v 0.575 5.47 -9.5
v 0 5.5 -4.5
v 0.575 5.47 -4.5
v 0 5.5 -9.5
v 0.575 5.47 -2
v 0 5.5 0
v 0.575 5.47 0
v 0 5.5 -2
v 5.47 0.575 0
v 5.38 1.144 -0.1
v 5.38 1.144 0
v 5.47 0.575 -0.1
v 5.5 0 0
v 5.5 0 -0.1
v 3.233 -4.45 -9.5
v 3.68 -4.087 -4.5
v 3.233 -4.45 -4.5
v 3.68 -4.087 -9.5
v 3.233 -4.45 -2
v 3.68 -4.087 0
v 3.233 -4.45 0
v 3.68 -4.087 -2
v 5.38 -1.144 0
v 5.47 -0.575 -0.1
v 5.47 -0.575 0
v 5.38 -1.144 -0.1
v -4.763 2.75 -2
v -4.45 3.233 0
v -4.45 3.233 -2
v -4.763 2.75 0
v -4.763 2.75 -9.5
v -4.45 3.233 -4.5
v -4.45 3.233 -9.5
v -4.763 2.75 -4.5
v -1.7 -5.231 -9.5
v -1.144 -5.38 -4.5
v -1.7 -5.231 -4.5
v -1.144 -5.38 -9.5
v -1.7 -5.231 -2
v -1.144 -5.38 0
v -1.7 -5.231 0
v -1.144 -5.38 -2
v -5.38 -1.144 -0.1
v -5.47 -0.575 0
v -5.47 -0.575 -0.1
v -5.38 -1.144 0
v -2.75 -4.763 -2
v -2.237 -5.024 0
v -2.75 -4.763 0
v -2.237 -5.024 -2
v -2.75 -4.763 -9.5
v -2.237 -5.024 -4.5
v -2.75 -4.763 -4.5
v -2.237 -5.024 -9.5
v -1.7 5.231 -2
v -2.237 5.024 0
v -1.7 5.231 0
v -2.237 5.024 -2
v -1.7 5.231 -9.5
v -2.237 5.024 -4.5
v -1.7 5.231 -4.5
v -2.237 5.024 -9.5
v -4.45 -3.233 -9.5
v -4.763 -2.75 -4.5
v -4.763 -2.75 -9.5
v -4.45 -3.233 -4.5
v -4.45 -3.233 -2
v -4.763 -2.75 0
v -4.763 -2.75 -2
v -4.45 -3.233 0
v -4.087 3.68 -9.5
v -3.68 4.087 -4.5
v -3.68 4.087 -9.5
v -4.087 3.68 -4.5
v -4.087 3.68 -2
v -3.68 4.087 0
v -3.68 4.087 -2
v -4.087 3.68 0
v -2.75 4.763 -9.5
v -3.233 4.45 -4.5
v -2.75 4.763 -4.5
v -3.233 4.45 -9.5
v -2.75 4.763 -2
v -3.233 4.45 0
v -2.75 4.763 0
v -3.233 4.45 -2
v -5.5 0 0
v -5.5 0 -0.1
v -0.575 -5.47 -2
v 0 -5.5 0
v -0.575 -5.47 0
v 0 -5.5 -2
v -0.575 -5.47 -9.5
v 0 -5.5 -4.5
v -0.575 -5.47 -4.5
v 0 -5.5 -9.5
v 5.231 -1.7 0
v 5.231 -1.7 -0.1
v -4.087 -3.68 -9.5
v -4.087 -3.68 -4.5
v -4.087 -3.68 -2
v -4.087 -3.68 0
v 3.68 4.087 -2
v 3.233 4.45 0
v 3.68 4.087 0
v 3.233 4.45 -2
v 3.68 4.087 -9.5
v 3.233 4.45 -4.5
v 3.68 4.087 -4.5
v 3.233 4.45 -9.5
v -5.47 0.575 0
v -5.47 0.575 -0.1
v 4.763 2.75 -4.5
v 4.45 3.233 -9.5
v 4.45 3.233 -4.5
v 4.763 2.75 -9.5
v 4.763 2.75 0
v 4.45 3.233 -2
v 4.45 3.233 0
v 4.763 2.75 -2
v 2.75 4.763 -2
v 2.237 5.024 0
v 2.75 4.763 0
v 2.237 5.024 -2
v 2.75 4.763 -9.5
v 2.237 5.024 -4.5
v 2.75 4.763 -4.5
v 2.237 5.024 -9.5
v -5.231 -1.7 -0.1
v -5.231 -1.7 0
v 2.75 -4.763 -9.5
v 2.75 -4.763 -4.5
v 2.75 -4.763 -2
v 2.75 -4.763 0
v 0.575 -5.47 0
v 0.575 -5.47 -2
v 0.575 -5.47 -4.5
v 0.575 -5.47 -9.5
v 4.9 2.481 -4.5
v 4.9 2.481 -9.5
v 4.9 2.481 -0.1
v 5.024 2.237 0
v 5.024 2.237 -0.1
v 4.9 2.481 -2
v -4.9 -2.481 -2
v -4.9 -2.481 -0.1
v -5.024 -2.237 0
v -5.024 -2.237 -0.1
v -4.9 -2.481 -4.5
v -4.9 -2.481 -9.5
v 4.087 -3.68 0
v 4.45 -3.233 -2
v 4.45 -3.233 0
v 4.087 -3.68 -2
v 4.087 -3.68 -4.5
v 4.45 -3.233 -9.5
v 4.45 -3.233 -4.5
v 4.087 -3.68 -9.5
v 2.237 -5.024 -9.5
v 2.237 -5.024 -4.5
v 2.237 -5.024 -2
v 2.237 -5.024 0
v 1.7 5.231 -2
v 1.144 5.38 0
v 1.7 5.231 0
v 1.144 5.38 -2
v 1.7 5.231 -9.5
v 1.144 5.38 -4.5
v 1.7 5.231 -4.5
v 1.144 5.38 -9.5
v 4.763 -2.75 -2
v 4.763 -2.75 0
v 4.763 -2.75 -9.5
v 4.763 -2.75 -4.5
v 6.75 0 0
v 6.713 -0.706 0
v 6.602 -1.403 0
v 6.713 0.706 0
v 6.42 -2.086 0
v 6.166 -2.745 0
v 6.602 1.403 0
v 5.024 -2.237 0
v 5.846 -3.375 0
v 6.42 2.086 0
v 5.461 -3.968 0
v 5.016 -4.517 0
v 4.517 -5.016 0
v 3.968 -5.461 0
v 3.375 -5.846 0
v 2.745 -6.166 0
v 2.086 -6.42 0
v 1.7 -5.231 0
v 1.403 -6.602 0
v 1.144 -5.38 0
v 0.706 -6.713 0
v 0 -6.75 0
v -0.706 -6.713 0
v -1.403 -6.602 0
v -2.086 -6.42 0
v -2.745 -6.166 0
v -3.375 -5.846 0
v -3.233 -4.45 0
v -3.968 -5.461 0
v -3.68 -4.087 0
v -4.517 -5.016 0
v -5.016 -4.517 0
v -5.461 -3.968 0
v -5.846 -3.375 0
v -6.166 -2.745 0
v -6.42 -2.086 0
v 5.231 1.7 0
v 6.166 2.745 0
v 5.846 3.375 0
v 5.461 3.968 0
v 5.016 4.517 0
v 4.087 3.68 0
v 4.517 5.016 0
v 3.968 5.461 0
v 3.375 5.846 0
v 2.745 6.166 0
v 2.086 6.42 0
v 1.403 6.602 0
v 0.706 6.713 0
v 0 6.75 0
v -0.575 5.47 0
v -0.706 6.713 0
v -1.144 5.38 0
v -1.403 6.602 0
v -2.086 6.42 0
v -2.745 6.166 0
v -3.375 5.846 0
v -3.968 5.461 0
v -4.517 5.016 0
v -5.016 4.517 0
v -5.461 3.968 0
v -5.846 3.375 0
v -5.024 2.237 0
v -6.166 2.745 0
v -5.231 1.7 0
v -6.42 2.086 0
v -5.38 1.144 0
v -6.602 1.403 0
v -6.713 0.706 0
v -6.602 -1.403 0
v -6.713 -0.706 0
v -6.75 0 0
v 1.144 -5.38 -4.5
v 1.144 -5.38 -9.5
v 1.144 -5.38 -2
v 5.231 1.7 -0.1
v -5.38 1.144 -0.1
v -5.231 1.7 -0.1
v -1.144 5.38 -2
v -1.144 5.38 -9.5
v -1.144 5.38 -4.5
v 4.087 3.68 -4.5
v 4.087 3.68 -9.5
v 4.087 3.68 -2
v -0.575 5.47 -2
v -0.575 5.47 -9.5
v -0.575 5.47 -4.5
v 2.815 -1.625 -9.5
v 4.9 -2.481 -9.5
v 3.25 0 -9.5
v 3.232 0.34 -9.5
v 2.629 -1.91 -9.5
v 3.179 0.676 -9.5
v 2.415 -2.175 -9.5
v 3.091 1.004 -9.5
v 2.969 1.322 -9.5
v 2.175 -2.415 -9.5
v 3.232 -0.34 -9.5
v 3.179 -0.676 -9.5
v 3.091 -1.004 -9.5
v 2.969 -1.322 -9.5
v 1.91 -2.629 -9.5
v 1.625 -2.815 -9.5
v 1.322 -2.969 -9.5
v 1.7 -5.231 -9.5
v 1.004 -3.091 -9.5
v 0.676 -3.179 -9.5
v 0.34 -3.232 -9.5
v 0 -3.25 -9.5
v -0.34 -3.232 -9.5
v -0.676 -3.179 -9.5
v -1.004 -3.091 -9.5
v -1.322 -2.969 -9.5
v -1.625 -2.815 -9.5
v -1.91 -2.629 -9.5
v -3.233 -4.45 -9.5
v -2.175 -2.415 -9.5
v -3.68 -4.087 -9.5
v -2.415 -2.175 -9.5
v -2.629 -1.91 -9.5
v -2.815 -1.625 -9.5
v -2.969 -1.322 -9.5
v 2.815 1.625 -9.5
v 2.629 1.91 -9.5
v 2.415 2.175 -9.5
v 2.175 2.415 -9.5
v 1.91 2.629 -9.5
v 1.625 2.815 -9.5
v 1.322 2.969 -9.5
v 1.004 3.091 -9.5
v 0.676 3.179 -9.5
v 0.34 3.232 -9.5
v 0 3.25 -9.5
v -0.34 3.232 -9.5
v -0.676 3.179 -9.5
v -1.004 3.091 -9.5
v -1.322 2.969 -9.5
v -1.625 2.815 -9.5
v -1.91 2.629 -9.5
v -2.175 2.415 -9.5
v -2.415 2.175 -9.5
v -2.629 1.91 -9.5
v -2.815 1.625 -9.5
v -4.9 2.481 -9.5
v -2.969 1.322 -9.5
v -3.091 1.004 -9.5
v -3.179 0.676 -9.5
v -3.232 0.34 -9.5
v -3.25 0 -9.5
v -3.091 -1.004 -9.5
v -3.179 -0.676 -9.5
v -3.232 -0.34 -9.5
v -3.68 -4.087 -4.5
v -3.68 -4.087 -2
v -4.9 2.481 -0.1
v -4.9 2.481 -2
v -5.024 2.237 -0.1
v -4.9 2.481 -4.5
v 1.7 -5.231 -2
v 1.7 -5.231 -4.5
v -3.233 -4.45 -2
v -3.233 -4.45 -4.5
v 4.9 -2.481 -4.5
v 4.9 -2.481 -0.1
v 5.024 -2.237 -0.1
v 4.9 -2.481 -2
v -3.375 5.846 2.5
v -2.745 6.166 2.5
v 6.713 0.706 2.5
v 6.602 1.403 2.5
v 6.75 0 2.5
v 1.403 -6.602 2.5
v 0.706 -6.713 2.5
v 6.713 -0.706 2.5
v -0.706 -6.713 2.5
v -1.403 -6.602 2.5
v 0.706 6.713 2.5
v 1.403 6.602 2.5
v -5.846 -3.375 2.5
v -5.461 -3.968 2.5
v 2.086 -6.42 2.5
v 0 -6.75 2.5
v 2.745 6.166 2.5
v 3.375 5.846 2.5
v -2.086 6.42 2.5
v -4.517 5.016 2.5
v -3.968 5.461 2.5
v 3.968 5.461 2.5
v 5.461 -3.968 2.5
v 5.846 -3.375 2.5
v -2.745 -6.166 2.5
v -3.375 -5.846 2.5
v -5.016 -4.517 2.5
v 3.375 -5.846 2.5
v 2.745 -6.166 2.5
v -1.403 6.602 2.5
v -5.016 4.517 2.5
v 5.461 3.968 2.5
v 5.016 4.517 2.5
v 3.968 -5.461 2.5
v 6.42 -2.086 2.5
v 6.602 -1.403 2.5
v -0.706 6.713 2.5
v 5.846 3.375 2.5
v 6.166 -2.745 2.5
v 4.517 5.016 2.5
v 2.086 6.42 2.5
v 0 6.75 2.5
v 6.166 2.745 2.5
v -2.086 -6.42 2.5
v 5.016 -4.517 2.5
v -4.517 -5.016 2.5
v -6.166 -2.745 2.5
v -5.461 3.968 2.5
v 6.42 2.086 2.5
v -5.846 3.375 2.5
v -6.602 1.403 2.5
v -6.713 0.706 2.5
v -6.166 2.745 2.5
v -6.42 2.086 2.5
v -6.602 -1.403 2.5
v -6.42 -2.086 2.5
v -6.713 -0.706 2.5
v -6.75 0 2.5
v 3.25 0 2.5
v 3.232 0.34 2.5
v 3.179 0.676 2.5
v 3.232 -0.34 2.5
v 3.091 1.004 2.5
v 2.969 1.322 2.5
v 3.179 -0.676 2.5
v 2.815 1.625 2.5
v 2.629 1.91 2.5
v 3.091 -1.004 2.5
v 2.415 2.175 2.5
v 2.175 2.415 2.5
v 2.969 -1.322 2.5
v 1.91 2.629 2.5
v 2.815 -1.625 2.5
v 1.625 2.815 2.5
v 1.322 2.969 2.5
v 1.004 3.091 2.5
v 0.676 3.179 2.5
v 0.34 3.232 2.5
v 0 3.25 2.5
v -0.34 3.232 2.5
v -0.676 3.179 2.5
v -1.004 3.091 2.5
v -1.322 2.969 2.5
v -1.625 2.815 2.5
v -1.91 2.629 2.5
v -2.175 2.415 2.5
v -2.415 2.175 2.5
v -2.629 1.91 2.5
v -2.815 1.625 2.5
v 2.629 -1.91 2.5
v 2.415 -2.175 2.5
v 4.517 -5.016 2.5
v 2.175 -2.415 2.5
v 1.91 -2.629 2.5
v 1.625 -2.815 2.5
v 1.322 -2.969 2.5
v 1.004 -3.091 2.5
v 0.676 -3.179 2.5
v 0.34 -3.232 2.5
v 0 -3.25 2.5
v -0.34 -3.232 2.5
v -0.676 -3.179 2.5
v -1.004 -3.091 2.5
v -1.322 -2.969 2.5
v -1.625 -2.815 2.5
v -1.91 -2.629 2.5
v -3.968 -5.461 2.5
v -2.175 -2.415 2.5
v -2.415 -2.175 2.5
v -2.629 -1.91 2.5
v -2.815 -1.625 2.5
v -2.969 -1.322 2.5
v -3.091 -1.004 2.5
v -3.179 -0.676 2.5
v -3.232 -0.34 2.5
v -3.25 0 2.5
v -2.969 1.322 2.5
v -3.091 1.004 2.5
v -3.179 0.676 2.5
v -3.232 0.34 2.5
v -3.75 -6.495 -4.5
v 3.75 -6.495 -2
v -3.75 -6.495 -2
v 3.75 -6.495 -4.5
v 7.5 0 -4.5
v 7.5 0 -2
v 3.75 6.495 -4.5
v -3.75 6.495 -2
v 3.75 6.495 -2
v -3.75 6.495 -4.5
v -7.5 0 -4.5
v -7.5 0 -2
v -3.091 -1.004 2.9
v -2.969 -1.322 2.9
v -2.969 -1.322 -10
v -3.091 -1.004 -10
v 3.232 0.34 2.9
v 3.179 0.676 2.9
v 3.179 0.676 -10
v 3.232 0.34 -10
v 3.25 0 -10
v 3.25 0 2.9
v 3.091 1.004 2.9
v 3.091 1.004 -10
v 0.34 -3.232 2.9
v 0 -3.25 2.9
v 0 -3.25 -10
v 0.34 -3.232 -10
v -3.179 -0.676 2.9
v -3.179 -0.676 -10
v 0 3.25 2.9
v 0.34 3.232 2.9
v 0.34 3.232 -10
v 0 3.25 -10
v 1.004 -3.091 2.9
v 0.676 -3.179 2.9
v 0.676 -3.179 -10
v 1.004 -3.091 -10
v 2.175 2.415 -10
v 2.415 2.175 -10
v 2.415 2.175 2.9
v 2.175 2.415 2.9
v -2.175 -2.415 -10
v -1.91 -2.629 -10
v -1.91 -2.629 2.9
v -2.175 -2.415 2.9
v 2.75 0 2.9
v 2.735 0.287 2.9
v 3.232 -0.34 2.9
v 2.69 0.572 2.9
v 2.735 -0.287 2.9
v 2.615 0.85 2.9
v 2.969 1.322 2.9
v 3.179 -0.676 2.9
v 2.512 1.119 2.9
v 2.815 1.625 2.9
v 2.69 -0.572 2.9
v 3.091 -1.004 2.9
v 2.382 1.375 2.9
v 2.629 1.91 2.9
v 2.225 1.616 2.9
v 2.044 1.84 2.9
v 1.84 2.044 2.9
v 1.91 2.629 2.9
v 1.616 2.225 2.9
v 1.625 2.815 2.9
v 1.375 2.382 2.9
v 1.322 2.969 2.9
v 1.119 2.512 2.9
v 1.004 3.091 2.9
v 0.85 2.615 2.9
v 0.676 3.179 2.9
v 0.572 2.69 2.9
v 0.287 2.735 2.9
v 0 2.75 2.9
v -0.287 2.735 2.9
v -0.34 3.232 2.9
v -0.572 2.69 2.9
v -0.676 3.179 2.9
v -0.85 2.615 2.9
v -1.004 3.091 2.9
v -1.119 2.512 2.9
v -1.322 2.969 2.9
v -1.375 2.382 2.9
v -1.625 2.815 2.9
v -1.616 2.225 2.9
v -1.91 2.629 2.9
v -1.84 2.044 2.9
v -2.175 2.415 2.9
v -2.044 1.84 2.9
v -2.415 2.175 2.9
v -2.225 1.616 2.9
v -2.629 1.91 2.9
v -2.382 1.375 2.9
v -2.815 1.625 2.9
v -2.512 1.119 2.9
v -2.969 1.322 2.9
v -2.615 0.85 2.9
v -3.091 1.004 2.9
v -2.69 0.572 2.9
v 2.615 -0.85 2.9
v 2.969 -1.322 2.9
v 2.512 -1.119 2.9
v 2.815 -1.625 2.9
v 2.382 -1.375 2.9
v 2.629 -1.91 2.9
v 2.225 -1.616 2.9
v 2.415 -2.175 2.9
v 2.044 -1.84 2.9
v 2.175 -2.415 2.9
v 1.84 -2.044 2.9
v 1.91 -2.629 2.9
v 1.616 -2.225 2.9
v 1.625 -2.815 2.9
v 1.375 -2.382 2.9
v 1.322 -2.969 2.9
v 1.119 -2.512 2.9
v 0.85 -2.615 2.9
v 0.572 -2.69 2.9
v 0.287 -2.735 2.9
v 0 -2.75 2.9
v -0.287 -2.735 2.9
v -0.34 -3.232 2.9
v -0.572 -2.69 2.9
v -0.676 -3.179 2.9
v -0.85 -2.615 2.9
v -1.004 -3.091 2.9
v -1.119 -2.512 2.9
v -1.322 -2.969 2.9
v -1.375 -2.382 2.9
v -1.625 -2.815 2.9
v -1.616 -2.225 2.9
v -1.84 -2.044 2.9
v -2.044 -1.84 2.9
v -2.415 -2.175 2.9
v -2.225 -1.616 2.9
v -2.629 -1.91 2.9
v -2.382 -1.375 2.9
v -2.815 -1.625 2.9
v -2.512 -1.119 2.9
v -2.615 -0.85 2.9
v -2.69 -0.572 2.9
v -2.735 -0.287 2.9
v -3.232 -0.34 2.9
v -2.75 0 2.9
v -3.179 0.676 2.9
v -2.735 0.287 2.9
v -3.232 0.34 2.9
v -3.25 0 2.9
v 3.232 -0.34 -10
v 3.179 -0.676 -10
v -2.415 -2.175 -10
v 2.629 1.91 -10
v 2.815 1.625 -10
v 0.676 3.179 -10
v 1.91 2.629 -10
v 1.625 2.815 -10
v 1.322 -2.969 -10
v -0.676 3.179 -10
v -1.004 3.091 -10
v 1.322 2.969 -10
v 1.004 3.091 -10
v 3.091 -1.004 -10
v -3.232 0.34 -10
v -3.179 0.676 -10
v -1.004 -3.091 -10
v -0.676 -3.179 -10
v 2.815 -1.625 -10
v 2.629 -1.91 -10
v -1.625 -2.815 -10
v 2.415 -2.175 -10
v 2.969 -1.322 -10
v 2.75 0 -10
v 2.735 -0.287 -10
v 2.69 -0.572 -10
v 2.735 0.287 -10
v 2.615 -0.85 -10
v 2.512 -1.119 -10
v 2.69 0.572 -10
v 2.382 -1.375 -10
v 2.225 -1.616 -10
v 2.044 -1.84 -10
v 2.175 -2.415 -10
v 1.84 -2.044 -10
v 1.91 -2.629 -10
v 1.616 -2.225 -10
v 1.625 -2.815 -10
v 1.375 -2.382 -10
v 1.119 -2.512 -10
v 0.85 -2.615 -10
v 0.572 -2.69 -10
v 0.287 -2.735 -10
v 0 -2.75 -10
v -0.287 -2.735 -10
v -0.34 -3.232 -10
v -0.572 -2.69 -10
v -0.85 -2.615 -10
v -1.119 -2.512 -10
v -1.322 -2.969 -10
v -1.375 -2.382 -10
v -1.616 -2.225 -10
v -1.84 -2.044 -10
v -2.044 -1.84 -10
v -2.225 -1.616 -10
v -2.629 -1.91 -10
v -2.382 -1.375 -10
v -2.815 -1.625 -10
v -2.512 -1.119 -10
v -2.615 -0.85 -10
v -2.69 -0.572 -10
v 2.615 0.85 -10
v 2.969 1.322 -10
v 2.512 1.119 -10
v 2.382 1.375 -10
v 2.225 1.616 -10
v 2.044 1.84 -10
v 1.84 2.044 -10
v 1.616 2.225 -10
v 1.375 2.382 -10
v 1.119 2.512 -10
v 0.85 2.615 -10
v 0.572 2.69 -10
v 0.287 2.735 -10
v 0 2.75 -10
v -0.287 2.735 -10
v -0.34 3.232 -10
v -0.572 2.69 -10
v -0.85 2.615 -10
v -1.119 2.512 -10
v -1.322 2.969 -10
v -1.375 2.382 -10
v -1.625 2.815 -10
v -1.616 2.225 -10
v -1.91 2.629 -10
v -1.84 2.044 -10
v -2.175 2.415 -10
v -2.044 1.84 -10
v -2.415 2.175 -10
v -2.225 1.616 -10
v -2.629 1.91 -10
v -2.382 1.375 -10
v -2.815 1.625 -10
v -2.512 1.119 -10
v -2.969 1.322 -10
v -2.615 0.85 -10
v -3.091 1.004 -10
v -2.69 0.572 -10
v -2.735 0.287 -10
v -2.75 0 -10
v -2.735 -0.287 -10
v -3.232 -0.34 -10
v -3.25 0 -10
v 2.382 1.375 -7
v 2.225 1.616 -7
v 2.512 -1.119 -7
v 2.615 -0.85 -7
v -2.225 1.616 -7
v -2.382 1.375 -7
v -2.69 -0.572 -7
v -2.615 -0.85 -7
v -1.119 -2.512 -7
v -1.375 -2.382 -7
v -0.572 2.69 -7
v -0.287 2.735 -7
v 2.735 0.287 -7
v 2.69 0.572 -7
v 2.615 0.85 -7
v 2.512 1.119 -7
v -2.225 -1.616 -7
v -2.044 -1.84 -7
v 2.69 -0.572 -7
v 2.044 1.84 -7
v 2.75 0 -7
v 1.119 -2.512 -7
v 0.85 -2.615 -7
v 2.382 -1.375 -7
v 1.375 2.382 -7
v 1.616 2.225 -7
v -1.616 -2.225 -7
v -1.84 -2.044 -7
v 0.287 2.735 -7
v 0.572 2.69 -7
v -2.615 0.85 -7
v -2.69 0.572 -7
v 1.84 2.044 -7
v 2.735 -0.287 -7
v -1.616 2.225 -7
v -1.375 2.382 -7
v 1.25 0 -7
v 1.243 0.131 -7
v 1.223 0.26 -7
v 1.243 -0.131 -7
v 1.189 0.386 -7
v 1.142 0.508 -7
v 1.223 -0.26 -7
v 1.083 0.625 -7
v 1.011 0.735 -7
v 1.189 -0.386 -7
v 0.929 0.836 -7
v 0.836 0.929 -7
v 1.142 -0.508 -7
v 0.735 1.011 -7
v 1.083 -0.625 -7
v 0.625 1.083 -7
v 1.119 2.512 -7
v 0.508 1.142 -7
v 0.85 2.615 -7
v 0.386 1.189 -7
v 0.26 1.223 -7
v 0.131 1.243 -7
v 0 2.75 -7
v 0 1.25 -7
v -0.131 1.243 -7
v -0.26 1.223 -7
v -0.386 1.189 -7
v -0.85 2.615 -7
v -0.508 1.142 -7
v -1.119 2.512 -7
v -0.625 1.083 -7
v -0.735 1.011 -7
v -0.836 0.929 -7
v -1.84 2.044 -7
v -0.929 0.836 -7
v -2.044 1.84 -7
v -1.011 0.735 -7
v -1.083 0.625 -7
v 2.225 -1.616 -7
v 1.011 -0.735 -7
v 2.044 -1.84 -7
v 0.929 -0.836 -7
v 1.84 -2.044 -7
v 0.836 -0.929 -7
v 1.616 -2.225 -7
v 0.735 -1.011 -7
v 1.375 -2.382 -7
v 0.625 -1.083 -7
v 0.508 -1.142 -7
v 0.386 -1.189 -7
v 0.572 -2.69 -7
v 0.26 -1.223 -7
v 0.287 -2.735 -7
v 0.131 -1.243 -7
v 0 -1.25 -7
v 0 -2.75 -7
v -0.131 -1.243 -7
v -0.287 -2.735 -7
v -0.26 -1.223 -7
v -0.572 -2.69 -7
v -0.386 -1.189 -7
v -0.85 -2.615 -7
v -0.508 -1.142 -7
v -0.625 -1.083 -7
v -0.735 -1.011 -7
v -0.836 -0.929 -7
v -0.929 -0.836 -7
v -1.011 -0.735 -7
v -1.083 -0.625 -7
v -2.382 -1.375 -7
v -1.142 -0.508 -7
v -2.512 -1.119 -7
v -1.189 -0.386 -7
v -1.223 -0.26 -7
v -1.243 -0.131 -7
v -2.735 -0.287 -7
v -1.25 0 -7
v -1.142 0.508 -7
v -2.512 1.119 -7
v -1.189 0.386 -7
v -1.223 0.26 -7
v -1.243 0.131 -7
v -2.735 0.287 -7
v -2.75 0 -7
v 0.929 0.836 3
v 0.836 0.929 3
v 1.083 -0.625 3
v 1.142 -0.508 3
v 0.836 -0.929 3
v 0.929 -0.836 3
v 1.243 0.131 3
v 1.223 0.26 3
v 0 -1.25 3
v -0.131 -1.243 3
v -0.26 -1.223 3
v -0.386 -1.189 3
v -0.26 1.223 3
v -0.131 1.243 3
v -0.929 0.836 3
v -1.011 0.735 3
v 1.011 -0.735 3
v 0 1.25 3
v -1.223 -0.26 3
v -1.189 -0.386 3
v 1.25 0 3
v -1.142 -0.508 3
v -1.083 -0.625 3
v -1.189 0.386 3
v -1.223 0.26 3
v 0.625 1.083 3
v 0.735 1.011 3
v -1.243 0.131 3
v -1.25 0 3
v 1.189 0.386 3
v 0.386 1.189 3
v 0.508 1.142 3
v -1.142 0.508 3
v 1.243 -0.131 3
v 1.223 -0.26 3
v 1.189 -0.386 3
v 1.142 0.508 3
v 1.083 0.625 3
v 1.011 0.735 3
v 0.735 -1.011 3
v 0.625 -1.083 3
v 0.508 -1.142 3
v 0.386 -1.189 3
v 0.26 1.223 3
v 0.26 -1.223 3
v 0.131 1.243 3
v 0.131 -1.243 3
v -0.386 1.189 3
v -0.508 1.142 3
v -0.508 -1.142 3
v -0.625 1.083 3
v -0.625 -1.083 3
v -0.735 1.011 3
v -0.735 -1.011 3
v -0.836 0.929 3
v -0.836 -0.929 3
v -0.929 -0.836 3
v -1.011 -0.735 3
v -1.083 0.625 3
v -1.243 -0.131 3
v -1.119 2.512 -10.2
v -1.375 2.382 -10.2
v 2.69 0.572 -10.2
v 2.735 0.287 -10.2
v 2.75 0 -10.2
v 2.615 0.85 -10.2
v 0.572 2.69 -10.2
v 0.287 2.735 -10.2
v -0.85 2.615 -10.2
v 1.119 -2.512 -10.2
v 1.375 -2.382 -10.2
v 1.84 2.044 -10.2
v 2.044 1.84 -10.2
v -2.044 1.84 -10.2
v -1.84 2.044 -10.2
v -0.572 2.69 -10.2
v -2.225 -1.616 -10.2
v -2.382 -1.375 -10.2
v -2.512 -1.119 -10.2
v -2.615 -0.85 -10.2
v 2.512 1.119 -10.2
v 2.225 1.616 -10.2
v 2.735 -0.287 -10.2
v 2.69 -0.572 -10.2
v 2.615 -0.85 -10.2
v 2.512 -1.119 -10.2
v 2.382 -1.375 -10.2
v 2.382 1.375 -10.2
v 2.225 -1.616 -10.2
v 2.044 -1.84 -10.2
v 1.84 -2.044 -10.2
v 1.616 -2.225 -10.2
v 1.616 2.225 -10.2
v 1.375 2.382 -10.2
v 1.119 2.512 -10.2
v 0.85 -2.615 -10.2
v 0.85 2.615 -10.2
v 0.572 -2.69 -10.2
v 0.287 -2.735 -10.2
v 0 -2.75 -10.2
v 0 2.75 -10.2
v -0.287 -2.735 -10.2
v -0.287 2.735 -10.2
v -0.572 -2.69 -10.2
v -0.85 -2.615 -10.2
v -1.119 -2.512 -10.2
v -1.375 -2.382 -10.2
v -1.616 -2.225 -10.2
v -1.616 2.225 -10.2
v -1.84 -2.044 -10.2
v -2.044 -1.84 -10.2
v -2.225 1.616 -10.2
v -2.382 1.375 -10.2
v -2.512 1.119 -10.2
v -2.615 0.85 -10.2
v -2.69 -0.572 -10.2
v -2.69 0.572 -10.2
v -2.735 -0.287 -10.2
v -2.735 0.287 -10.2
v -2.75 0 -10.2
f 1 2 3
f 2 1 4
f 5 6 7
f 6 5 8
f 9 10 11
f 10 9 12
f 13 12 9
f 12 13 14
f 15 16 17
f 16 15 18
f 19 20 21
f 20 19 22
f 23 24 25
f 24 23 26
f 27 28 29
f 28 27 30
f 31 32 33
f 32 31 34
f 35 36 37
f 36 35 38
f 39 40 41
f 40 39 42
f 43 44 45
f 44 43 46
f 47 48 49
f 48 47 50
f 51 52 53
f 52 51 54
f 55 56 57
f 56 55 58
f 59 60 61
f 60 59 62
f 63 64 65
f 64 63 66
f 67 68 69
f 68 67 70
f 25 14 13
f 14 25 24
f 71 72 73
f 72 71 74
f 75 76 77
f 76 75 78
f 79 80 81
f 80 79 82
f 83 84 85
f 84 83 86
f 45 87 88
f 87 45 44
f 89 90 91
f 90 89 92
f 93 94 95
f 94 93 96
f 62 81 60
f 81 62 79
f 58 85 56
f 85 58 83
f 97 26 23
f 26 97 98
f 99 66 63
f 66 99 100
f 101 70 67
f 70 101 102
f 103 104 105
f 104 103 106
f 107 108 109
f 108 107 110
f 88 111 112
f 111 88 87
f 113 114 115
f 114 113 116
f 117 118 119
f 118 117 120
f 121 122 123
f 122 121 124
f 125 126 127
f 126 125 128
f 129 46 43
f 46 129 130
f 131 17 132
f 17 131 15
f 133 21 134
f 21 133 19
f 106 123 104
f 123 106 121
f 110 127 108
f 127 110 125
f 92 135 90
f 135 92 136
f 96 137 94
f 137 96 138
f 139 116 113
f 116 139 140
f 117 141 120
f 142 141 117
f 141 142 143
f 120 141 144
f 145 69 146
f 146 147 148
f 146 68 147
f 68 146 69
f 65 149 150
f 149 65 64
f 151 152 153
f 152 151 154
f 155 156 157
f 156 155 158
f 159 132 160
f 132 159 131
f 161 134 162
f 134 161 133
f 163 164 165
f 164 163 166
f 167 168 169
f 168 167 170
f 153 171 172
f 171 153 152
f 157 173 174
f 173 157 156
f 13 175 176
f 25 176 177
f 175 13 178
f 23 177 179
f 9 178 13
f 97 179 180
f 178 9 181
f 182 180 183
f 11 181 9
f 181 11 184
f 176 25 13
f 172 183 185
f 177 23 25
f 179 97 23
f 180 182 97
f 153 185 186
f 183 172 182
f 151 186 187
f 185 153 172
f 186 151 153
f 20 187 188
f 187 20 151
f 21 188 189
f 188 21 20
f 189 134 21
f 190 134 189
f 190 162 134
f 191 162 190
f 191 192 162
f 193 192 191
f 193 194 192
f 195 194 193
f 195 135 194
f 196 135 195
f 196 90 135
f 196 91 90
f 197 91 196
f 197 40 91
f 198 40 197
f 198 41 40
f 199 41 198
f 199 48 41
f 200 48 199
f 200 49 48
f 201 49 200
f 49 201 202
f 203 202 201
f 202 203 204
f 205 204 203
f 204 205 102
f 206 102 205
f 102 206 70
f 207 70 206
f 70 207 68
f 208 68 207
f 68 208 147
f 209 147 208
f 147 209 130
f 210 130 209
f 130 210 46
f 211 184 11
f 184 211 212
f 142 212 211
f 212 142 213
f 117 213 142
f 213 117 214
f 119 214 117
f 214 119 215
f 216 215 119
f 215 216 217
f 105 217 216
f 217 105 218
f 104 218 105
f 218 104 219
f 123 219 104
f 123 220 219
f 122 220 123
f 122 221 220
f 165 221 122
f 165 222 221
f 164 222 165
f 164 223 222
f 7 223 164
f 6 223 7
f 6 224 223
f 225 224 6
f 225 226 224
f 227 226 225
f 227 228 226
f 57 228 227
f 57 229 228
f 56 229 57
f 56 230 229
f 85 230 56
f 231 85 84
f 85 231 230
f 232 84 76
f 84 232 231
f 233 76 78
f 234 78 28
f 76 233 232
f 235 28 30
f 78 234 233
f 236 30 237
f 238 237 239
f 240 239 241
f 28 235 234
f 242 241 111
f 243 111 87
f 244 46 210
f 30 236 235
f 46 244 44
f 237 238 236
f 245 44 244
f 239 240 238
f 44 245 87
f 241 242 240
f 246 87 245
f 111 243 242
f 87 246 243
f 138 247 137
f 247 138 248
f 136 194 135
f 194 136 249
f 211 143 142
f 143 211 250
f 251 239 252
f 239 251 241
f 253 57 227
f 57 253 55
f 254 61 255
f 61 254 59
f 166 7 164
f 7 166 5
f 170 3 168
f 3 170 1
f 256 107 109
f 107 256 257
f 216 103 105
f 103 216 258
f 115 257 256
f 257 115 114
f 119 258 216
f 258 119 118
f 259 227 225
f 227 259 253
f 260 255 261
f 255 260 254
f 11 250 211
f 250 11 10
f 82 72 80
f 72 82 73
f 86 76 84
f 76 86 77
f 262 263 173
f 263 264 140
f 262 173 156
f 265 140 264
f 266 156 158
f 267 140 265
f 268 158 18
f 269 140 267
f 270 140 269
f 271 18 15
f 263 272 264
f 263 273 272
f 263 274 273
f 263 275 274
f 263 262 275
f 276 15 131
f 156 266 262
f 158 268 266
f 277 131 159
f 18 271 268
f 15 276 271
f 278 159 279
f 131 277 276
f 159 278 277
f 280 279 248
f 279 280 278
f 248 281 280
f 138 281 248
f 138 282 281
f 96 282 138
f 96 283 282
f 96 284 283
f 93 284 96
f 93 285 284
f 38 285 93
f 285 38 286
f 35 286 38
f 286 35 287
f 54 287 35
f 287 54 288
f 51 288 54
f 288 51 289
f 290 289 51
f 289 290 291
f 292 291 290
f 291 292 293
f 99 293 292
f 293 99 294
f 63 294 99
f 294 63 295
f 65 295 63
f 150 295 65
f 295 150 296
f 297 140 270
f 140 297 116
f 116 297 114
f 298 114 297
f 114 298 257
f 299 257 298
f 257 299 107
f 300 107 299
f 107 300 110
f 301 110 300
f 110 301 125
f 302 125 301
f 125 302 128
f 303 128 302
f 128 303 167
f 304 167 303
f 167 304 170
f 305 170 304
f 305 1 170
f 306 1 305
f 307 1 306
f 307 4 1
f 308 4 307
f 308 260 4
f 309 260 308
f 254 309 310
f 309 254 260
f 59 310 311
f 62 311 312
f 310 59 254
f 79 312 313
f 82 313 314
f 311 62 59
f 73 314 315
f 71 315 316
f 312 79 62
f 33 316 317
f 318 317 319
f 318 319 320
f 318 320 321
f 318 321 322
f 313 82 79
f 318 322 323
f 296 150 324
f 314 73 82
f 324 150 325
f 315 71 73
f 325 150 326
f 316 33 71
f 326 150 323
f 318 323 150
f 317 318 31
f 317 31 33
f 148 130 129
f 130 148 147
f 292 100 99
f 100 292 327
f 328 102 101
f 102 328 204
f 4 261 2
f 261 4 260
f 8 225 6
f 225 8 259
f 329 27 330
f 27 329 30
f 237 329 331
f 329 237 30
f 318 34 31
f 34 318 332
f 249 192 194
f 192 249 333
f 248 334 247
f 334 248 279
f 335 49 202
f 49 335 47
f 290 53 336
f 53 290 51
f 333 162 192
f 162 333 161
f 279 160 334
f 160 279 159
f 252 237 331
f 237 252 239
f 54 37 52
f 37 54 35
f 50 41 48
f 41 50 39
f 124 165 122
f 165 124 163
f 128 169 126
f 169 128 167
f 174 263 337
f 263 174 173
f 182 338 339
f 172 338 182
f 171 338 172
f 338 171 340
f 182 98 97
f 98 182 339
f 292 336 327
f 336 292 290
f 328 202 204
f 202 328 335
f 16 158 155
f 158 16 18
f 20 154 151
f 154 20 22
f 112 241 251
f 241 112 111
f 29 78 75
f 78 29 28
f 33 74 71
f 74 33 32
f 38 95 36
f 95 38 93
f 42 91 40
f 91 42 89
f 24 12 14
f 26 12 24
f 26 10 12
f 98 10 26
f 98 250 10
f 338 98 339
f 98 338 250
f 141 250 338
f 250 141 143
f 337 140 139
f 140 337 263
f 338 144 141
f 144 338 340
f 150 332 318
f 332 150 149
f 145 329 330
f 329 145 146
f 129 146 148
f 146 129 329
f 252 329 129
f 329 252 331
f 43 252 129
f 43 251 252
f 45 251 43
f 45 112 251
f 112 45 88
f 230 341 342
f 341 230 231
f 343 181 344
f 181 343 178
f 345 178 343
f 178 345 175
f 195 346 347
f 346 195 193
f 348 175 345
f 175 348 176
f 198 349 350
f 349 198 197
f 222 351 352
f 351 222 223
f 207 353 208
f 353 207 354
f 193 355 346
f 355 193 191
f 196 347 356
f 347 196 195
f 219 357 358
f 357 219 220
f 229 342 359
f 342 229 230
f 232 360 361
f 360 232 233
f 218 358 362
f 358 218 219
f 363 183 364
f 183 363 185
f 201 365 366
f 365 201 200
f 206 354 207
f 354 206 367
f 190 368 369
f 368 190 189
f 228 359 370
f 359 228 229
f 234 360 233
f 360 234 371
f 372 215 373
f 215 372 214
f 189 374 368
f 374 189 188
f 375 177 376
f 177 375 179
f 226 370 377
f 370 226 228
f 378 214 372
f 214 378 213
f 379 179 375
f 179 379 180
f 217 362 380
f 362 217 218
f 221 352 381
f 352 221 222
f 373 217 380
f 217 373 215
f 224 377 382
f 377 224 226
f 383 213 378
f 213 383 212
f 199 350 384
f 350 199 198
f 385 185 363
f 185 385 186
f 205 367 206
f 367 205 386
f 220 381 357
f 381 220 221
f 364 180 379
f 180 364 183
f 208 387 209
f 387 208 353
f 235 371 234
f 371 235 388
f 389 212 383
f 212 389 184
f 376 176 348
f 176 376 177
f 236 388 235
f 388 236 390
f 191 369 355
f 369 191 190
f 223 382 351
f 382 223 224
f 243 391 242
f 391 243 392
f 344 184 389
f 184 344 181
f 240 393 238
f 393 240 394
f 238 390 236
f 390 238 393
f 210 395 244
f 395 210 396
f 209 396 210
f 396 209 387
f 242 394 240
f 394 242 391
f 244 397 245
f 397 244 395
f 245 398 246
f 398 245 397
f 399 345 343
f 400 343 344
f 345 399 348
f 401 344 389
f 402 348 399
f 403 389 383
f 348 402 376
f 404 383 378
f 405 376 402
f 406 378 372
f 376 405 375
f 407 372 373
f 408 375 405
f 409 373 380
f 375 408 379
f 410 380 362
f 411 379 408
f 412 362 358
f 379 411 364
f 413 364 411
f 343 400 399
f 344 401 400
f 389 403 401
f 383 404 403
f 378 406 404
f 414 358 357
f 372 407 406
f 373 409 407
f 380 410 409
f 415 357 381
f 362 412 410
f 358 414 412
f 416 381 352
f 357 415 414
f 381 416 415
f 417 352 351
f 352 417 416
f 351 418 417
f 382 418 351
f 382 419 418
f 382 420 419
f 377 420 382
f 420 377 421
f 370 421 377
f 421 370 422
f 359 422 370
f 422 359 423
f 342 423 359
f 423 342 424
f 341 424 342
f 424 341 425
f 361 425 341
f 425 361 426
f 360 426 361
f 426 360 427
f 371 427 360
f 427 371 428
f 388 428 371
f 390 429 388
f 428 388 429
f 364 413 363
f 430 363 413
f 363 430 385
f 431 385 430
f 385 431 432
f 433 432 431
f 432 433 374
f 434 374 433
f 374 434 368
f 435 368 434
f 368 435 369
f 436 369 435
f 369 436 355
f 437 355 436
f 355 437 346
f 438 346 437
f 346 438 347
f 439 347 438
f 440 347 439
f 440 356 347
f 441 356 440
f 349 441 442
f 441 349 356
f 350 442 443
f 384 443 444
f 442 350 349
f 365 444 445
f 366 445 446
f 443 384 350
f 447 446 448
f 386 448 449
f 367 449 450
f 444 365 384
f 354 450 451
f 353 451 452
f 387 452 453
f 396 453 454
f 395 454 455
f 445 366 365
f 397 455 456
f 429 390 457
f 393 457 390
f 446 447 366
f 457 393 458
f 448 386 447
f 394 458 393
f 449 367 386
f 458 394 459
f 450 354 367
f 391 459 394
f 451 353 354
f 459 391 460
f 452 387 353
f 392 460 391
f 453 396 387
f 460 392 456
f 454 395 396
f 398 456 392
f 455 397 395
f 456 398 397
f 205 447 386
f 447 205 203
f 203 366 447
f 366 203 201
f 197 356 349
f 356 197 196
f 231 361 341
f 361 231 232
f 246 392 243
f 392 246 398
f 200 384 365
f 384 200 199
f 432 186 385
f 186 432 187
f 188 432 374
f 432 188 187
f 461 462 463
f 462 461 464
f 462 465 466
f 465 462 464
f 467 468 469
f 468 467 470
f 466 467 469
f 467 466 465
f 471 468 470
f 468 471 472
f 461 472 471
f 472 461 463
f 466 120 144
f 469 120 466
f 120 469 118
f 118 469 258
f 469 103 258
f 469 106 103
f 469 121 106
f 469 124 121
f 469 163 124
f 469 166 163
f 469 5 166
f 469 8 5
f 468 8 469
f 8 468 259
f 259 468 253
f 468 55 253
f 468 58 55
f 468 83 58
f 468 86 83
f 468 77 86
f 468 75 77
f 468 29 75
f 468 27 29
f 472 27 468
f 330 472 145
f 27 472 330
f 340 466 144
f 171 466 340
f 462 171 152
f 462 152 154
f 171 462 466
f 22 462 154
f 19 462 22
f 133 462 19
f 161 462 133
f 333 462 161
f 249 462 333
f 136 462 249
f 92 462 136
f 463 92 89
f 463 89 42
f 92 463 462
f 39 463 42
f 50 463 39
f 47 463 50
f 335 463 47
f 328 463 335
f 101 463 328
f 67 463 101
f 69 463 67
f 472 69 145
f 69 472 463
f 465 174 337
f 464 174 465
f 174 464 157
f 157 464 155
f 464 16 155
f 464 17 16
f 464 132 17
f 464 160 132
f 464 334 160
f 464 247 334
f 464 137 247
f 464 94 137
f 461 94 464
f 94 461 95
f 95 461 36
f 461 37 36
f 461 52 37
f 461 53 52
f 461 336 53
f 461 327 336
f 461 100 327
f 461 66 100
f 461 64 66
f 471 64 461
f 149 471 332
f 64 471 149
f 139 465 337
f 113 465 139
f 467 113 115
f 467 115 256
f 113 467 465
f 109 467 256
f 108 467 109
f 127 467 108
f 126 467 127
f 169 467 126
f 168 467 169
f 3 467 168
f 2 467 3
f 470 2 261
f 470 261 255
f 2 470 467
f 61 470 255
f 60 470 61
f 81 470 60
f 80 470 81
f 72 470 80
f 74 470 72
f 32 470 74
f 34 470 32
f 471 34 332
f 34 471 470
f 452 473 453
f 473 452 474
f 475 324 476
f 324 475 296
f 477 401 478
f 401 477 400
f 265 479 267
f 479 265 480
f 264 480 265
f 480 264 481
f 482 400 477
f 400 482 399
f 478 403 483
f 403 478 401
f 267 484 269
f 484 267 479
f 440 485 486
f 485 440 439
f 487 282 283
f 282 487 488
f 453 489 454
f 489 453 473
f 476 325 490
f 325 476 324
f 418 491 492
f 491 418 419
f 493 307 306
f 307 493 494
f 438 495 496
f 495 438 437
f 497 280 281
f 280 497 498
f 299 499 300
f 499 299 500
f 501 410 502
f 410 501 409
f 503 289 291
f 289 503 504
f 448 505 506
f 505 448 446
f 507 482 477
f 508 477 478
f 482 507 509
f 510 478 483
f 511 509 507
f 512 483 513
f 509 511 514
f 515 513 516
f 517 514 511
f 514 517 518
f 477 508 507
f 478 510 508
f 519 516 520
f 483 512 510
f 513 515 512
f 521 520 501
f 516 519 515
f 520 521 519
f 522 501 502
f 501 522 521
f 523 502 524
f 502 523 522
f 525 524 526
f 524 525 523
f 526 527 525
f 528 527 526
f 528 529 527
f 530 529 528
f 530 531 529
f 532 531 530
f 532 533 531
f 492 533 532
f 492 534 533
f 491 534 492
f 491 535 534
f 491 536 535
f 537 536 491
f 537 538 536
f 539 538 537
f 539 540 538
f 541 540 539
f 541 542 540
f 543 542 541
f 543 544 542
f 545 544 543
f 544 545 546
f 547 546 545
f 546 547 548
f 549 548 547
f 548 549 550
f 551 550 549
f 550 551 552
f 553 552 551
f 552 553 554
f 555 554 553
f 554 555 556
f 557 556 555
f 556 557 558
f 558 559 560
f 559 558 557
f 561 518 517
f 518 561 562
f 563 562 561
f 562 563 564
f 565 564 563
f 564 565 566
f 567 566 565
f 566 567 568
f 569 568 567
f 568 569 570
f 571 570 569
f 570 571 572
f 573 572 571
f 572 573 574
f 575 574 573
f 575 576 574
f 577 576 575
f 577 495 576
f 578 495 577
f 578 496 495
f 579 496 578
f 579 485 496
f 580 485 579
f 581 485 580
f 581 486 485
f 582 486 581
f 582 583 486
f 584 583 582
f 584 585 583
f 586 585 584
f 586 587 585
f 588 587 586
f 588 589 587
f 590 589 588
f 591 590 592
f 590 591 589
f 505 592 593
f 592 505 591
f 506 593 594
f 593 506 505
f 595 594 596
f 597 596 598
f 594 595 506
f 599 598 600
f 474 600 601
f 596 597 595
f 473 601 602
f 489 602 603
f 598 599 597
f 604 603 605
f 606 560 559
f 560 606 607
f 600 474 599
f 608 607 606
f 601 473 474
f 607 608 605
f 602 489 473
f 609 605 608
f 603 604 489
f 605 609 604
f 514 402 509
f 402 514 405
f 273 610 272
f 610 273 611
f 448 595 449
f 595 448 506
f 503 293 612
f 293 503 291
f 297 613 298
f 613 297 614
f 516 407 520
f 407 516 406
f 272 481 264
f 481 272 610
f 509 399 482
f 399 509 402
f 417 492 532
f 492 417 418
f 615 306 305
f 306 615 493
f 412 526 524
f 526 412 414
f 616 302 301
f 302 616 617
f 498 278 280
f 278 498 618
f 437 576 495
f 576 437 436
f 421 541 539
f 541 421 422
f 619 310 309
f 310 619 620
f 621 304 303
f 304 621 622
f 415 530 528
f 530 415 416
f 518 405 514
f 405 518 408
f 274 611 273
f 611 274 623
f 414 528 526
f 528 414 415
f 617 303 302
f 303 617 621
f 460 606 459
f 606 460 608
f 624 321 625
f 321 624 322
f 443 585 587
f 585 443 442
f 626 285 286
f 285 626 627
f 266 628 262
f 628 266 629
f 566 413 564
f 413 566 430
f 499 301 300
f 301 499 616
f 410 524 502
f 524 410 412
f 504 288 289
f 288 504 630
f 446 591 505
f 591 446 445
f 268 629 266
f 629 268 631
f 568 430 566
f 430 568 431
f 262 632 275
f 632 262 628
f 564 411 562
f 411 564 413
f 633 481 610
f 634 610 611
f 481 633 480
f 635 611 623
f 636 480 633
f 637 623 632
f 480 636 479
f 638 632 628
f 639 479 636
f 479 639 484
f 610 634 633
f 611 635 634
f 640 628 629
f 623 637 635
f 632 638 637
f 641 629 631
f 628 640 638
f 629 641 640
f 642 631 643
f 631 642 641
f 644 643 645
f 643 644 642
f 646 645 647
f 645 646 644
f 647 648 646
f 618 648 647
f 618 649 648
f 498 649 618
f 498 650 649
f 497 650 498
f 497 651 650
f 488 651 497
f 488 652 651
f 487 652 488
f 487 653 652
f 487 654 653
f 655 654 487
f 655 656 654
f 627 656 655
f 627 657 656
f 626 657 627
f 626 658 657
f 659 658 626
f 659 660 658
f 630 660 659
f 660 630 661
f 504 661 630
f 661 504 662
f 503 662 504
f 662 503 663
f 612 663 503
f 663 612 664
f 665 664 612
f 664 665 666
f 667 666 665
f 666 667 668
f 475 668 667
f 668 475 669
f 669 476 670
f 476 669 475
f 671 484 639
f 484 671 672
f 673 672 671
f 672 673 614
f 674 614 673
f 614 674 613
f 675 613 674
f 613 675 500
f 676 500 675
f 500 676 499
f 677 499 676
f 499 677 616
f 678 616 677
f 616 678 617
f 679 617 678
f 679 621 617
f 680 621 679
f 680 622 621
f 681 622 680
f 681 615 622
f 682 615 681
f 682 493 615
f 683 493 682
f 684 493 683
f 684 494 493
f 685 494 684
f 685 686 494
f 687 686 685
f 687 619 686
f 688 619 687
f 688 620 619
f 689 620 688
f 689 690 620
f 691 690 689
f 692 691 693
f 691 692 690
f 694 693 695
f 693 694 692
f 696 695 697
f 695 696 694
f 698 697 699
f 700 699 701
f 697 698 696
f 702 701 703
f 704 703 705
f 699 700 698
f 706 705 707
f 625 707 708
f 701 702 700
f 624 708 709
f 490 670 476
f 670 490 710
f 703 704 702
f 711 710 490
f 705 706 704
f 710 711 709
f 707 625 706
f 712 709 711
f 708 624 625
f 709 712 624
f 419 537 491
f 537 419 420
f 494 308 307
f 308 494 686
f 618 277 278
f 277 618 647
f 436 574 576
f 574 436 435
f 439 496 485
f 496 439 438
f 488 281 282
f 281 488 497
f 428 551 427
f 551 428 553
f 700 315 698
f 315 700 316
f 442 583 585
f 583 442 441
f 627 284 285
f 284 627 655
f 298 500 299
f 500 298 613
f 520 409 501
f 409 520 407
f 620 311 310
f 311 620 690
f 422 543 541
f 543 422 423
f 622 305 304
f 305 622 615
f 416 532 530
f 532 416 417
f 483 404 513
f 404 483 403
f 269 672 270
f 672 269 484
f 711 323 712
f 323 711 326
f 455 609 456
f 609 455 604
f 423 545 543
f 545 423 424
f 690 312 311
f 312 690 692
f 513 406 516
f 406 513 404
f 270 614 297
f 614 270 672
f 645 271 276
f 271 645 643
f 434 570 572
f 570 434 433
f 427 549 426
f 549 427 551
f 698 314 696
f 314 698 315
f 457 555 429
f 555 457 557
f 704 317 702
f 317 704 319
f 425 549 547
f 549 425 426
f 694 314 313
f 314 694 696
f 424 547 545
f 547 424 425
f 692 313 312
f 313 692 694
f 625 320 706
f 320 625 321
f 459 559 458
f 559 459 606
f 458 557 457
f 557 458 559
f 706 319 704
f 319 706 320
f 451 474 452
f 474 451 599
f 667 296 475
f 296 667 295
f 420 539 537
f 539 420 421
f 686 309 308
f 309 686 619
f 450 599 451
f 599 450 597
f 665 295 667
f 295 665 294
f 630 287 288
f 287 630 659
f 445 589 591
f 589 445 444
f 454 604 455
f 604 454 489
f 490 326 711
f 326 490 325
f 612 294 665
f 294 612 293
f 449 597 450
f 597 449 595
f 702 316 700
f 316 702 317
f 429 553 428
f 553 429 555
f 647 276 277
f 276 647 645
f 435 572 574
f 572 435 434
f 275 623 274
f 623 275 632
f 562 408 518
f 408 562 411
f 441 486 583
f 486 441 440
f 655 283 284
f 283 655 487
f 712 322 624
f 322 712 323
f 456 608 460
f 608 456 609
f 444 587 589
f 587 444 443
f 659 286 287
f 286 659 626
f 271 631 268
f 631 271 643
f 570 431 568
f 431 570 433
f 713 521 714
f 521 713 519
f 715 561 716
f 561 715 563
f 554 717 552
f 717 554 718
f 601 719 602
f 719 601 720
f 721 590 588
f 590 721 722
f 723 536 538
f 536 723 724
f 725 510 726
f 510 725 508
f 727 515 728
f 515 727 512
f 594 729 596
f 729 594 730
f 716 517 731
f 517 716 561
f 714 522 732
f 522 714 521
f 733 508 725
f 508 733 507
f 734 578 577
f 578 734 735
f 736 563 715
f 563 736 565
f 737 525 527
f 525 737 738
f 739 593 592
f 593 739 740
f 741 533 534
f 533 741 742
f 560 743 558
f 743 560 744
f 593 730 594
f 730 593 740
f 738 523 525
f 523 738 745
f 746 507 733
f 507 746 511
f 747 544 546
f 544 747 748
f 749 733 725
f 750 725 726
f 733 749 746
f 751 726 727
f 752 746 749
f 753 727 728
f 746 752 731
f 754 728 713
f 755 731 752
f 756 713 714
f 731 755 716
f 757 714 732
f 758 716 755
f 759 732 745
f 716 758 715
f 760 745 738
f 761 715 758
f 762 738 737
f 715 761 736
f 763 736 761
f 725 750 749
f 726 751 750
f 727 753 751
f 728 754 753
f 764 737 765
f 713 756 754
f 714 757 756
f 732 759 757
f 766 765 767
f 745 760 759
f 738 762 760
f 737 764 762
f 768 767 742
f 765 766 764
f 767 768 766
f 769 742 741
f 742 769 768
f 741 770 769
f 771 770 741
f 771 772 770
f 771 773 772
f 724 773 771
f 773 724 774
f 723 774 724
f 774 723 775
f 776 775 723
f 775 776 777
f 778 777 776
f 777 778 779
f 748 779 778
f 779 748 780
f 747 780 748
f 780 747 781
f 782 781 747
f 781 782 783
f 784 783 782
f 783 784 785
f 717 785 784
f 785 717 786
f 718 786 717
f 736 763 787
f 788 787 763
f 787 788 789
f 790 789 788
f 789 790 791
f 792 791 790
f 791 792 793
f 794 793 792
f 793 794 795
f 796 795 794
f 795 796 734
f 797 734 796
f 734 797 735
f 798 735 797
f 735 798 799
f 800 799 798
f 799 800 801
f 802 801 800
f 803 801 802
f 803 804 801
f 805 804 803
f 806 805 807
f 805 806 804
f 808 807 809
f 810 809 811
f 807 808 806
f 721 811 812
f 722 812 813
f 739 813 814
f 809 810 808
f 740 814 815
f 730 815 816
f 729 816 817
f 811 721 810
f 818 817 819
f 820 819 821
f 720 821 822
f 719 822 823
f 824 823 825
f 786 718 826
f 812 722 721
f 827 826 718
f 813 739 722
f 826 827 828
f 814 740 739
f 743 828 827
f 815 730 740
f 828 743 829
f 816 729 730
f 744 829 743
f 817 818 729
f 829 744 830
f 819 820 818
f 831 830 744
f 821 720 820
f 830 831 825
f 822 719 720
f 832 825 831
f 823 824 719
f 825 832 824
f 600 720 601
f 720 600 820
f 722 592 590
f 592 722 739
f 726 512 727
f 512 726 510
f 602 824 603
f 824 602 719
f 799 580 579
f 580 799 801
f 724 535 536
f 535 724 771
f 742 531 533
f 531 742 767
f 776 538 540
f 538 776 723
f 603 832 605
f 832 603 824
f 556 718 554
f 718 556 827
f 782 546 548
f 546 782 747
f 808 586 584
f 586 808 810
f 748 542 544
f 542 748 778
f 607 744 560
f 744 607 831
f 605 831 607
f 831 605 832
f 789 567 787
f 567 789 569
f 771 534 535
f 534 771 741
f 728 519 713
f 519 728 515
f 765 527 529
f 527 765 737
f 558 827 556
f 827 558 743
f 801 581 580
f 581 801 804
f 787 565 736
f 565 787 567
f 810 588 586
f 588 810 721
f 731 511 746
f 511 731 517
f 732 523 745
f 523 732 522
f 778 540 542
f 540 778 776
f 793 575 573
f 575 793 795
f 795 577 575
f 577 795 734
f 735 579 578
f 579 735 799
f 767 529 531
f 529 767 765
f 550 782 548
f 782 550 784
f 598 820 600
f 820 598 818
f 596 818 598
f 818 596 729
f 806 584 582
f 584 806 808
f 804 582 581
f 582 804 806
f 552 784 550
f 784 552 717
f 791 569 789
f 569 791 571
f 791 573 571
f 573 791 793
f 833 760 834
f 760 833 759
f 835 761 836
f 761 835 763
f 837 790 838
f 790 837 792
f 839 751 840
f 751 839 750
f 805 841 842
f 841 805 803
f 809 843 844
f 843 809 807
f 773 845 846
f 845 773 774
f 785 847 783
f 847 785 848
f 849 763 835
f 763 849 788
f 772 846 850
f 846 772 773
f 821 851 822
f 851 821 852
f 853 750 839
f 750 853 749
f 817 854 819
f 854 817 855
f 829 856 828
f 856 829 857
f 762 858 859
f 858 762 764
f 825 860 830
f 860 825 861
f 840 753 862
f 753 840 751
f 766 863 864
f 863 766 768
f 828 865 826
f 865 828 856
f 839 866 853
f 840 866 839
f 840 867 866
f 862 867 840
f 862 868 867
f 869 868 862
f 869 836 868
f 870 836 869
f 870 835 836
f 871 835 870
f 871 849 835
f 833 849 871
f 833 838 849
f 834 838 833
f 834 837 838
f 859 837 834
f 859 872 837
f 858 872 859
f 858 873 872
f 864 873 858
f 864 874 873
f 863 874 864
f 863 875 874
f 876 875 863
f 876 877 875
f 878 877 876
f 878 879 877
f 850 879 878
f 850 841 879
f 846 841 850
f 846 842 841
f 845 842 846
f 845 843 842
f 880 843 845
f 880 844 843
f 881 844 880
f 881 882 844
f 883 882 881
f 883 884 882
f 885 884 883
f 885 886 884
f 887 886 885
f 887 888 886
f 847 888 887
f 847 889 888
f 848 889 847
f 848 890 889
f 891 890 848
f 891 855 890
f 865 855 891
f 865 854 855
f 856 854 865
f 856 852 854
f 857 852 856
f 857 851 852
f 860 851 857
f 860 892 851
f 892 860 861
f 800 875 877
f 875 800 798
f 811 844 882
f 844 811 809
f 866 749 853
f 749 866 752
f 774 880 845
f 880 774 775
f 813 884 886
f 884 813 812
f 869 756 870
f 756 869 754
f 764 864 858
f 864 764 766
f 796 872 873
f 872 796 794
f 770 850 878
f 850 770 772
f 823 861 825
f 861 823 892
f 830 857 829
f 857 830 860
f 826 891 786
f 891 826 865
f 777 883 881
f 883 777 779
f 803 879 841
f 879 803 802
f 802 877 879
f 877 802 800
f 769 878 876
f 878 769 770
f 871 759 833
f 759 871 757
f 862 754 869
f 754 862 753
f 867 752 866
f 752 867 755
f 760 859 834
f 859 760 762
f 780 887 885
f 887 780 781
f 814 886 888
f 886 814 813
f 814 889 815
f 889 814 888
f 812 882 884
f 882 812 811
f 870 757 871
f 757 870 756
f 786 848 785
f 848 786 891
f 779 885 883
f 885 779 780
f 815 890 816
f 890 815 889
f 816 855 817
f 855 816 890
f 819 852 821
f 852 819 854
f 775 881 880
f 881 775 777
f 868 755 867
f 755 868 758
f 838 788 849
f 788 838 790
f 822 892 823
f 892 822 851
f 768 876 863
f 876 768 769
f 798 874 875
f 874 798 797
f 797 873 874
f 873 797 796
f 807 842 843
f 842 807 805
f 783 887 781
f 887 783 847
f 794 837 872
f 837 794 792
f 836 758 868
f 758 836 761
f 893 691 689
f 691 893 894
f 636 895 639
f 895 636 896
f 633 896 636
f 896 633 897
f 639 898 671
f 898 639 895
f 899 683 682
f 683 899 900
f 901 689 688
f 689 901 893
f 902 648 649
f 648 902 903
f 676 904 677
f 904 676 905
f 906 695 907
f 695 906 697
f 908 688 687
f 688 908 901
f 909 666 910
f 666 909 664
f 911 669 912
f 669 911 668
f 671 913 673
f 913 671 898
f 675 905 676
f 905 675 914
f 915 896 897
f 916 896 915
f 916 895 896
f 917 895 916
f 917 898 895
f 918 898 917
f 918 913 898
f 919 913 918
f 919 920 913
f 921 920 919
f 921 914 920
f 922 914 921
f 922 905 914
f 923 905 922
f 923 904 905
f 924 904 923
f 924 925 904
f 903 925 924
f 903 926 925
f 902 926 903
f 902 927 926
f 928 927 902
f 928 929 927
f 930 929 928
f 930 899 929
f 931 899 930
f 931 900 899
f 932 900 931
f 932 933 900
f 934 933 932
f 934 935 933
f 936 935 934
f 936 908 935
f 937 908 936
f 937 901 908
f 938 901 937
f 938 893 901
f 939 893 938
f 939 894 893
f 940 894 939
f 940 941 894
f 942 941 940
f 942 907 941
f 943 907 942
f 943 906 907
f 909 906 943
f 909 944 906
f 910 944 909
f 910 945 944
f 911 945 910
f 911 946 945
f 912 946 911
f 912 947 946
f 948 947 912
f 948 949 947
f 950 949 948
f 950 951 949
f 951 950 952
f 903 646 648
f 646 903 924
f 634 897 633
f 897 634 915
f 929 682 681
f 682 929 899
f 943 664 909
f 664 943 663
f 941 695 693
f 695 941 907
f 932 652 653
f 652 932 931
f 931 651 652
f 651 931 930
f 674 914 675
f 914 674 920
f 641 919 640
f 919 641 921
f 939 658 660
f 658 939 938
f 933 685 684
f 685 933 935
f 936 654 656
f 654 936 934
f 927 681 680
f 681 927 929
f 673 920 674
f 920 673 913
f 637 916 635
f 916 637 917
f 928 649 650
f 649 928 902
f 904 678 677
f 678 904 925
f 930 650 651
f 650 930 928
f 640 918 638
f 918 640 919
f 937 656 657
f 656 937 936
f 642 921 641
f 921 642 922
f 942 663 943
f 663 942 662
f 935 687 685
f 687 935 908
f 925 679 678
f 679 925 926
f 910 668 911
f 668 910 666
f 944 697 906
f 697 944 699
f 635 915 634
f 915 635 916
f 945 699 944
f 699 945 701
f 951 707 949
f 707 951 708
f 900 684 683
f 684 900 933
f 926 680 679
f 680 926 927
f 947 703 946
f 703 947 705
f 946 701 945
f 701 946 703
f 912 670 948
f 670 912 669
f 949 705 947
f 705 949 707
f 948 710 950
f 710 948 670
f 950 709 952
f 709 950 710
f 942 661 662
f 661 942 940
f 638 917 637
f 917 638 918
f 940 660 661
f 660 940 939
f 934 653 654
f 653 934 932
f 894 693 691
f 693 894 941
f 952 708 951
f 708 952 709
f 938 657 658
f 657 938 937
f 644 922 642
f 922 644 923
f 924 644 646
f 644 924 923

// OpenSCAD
$fn=60;

 {
    difference() {
        union() {
            color("#404040") cylinder(d=13.5, h=2.5);
            color("#404040") difference() {
                translate([0,0,-9.5]) cylinder(d=11, h=9.5);
                translate([(9.8/2),-10,-9.6]) cube([20, 20, 9.5]);
                translate([-(9.8/2)-20,-10,-9.6]) cube([20, 20, 9.5]);
                
            }
            color("lightgray") translate([0,0,-2.5-2]) cylinder(d=15, h=2.5, $fn=6);
            color("lightgray") translate([0,0,-10]) cylinder(d=6.5, h=12.9);
        }
        translate([0,0,-7]) cylinder(d=5.5, h=10);
    }
    color("lightgray") translate([0,0,-7]) cylinder(d=2.5, h=10);
    color("#404040") translate([0,0,-10.2]) cylinder(d=5.5, h=1);
}



//cylinder(d=)
